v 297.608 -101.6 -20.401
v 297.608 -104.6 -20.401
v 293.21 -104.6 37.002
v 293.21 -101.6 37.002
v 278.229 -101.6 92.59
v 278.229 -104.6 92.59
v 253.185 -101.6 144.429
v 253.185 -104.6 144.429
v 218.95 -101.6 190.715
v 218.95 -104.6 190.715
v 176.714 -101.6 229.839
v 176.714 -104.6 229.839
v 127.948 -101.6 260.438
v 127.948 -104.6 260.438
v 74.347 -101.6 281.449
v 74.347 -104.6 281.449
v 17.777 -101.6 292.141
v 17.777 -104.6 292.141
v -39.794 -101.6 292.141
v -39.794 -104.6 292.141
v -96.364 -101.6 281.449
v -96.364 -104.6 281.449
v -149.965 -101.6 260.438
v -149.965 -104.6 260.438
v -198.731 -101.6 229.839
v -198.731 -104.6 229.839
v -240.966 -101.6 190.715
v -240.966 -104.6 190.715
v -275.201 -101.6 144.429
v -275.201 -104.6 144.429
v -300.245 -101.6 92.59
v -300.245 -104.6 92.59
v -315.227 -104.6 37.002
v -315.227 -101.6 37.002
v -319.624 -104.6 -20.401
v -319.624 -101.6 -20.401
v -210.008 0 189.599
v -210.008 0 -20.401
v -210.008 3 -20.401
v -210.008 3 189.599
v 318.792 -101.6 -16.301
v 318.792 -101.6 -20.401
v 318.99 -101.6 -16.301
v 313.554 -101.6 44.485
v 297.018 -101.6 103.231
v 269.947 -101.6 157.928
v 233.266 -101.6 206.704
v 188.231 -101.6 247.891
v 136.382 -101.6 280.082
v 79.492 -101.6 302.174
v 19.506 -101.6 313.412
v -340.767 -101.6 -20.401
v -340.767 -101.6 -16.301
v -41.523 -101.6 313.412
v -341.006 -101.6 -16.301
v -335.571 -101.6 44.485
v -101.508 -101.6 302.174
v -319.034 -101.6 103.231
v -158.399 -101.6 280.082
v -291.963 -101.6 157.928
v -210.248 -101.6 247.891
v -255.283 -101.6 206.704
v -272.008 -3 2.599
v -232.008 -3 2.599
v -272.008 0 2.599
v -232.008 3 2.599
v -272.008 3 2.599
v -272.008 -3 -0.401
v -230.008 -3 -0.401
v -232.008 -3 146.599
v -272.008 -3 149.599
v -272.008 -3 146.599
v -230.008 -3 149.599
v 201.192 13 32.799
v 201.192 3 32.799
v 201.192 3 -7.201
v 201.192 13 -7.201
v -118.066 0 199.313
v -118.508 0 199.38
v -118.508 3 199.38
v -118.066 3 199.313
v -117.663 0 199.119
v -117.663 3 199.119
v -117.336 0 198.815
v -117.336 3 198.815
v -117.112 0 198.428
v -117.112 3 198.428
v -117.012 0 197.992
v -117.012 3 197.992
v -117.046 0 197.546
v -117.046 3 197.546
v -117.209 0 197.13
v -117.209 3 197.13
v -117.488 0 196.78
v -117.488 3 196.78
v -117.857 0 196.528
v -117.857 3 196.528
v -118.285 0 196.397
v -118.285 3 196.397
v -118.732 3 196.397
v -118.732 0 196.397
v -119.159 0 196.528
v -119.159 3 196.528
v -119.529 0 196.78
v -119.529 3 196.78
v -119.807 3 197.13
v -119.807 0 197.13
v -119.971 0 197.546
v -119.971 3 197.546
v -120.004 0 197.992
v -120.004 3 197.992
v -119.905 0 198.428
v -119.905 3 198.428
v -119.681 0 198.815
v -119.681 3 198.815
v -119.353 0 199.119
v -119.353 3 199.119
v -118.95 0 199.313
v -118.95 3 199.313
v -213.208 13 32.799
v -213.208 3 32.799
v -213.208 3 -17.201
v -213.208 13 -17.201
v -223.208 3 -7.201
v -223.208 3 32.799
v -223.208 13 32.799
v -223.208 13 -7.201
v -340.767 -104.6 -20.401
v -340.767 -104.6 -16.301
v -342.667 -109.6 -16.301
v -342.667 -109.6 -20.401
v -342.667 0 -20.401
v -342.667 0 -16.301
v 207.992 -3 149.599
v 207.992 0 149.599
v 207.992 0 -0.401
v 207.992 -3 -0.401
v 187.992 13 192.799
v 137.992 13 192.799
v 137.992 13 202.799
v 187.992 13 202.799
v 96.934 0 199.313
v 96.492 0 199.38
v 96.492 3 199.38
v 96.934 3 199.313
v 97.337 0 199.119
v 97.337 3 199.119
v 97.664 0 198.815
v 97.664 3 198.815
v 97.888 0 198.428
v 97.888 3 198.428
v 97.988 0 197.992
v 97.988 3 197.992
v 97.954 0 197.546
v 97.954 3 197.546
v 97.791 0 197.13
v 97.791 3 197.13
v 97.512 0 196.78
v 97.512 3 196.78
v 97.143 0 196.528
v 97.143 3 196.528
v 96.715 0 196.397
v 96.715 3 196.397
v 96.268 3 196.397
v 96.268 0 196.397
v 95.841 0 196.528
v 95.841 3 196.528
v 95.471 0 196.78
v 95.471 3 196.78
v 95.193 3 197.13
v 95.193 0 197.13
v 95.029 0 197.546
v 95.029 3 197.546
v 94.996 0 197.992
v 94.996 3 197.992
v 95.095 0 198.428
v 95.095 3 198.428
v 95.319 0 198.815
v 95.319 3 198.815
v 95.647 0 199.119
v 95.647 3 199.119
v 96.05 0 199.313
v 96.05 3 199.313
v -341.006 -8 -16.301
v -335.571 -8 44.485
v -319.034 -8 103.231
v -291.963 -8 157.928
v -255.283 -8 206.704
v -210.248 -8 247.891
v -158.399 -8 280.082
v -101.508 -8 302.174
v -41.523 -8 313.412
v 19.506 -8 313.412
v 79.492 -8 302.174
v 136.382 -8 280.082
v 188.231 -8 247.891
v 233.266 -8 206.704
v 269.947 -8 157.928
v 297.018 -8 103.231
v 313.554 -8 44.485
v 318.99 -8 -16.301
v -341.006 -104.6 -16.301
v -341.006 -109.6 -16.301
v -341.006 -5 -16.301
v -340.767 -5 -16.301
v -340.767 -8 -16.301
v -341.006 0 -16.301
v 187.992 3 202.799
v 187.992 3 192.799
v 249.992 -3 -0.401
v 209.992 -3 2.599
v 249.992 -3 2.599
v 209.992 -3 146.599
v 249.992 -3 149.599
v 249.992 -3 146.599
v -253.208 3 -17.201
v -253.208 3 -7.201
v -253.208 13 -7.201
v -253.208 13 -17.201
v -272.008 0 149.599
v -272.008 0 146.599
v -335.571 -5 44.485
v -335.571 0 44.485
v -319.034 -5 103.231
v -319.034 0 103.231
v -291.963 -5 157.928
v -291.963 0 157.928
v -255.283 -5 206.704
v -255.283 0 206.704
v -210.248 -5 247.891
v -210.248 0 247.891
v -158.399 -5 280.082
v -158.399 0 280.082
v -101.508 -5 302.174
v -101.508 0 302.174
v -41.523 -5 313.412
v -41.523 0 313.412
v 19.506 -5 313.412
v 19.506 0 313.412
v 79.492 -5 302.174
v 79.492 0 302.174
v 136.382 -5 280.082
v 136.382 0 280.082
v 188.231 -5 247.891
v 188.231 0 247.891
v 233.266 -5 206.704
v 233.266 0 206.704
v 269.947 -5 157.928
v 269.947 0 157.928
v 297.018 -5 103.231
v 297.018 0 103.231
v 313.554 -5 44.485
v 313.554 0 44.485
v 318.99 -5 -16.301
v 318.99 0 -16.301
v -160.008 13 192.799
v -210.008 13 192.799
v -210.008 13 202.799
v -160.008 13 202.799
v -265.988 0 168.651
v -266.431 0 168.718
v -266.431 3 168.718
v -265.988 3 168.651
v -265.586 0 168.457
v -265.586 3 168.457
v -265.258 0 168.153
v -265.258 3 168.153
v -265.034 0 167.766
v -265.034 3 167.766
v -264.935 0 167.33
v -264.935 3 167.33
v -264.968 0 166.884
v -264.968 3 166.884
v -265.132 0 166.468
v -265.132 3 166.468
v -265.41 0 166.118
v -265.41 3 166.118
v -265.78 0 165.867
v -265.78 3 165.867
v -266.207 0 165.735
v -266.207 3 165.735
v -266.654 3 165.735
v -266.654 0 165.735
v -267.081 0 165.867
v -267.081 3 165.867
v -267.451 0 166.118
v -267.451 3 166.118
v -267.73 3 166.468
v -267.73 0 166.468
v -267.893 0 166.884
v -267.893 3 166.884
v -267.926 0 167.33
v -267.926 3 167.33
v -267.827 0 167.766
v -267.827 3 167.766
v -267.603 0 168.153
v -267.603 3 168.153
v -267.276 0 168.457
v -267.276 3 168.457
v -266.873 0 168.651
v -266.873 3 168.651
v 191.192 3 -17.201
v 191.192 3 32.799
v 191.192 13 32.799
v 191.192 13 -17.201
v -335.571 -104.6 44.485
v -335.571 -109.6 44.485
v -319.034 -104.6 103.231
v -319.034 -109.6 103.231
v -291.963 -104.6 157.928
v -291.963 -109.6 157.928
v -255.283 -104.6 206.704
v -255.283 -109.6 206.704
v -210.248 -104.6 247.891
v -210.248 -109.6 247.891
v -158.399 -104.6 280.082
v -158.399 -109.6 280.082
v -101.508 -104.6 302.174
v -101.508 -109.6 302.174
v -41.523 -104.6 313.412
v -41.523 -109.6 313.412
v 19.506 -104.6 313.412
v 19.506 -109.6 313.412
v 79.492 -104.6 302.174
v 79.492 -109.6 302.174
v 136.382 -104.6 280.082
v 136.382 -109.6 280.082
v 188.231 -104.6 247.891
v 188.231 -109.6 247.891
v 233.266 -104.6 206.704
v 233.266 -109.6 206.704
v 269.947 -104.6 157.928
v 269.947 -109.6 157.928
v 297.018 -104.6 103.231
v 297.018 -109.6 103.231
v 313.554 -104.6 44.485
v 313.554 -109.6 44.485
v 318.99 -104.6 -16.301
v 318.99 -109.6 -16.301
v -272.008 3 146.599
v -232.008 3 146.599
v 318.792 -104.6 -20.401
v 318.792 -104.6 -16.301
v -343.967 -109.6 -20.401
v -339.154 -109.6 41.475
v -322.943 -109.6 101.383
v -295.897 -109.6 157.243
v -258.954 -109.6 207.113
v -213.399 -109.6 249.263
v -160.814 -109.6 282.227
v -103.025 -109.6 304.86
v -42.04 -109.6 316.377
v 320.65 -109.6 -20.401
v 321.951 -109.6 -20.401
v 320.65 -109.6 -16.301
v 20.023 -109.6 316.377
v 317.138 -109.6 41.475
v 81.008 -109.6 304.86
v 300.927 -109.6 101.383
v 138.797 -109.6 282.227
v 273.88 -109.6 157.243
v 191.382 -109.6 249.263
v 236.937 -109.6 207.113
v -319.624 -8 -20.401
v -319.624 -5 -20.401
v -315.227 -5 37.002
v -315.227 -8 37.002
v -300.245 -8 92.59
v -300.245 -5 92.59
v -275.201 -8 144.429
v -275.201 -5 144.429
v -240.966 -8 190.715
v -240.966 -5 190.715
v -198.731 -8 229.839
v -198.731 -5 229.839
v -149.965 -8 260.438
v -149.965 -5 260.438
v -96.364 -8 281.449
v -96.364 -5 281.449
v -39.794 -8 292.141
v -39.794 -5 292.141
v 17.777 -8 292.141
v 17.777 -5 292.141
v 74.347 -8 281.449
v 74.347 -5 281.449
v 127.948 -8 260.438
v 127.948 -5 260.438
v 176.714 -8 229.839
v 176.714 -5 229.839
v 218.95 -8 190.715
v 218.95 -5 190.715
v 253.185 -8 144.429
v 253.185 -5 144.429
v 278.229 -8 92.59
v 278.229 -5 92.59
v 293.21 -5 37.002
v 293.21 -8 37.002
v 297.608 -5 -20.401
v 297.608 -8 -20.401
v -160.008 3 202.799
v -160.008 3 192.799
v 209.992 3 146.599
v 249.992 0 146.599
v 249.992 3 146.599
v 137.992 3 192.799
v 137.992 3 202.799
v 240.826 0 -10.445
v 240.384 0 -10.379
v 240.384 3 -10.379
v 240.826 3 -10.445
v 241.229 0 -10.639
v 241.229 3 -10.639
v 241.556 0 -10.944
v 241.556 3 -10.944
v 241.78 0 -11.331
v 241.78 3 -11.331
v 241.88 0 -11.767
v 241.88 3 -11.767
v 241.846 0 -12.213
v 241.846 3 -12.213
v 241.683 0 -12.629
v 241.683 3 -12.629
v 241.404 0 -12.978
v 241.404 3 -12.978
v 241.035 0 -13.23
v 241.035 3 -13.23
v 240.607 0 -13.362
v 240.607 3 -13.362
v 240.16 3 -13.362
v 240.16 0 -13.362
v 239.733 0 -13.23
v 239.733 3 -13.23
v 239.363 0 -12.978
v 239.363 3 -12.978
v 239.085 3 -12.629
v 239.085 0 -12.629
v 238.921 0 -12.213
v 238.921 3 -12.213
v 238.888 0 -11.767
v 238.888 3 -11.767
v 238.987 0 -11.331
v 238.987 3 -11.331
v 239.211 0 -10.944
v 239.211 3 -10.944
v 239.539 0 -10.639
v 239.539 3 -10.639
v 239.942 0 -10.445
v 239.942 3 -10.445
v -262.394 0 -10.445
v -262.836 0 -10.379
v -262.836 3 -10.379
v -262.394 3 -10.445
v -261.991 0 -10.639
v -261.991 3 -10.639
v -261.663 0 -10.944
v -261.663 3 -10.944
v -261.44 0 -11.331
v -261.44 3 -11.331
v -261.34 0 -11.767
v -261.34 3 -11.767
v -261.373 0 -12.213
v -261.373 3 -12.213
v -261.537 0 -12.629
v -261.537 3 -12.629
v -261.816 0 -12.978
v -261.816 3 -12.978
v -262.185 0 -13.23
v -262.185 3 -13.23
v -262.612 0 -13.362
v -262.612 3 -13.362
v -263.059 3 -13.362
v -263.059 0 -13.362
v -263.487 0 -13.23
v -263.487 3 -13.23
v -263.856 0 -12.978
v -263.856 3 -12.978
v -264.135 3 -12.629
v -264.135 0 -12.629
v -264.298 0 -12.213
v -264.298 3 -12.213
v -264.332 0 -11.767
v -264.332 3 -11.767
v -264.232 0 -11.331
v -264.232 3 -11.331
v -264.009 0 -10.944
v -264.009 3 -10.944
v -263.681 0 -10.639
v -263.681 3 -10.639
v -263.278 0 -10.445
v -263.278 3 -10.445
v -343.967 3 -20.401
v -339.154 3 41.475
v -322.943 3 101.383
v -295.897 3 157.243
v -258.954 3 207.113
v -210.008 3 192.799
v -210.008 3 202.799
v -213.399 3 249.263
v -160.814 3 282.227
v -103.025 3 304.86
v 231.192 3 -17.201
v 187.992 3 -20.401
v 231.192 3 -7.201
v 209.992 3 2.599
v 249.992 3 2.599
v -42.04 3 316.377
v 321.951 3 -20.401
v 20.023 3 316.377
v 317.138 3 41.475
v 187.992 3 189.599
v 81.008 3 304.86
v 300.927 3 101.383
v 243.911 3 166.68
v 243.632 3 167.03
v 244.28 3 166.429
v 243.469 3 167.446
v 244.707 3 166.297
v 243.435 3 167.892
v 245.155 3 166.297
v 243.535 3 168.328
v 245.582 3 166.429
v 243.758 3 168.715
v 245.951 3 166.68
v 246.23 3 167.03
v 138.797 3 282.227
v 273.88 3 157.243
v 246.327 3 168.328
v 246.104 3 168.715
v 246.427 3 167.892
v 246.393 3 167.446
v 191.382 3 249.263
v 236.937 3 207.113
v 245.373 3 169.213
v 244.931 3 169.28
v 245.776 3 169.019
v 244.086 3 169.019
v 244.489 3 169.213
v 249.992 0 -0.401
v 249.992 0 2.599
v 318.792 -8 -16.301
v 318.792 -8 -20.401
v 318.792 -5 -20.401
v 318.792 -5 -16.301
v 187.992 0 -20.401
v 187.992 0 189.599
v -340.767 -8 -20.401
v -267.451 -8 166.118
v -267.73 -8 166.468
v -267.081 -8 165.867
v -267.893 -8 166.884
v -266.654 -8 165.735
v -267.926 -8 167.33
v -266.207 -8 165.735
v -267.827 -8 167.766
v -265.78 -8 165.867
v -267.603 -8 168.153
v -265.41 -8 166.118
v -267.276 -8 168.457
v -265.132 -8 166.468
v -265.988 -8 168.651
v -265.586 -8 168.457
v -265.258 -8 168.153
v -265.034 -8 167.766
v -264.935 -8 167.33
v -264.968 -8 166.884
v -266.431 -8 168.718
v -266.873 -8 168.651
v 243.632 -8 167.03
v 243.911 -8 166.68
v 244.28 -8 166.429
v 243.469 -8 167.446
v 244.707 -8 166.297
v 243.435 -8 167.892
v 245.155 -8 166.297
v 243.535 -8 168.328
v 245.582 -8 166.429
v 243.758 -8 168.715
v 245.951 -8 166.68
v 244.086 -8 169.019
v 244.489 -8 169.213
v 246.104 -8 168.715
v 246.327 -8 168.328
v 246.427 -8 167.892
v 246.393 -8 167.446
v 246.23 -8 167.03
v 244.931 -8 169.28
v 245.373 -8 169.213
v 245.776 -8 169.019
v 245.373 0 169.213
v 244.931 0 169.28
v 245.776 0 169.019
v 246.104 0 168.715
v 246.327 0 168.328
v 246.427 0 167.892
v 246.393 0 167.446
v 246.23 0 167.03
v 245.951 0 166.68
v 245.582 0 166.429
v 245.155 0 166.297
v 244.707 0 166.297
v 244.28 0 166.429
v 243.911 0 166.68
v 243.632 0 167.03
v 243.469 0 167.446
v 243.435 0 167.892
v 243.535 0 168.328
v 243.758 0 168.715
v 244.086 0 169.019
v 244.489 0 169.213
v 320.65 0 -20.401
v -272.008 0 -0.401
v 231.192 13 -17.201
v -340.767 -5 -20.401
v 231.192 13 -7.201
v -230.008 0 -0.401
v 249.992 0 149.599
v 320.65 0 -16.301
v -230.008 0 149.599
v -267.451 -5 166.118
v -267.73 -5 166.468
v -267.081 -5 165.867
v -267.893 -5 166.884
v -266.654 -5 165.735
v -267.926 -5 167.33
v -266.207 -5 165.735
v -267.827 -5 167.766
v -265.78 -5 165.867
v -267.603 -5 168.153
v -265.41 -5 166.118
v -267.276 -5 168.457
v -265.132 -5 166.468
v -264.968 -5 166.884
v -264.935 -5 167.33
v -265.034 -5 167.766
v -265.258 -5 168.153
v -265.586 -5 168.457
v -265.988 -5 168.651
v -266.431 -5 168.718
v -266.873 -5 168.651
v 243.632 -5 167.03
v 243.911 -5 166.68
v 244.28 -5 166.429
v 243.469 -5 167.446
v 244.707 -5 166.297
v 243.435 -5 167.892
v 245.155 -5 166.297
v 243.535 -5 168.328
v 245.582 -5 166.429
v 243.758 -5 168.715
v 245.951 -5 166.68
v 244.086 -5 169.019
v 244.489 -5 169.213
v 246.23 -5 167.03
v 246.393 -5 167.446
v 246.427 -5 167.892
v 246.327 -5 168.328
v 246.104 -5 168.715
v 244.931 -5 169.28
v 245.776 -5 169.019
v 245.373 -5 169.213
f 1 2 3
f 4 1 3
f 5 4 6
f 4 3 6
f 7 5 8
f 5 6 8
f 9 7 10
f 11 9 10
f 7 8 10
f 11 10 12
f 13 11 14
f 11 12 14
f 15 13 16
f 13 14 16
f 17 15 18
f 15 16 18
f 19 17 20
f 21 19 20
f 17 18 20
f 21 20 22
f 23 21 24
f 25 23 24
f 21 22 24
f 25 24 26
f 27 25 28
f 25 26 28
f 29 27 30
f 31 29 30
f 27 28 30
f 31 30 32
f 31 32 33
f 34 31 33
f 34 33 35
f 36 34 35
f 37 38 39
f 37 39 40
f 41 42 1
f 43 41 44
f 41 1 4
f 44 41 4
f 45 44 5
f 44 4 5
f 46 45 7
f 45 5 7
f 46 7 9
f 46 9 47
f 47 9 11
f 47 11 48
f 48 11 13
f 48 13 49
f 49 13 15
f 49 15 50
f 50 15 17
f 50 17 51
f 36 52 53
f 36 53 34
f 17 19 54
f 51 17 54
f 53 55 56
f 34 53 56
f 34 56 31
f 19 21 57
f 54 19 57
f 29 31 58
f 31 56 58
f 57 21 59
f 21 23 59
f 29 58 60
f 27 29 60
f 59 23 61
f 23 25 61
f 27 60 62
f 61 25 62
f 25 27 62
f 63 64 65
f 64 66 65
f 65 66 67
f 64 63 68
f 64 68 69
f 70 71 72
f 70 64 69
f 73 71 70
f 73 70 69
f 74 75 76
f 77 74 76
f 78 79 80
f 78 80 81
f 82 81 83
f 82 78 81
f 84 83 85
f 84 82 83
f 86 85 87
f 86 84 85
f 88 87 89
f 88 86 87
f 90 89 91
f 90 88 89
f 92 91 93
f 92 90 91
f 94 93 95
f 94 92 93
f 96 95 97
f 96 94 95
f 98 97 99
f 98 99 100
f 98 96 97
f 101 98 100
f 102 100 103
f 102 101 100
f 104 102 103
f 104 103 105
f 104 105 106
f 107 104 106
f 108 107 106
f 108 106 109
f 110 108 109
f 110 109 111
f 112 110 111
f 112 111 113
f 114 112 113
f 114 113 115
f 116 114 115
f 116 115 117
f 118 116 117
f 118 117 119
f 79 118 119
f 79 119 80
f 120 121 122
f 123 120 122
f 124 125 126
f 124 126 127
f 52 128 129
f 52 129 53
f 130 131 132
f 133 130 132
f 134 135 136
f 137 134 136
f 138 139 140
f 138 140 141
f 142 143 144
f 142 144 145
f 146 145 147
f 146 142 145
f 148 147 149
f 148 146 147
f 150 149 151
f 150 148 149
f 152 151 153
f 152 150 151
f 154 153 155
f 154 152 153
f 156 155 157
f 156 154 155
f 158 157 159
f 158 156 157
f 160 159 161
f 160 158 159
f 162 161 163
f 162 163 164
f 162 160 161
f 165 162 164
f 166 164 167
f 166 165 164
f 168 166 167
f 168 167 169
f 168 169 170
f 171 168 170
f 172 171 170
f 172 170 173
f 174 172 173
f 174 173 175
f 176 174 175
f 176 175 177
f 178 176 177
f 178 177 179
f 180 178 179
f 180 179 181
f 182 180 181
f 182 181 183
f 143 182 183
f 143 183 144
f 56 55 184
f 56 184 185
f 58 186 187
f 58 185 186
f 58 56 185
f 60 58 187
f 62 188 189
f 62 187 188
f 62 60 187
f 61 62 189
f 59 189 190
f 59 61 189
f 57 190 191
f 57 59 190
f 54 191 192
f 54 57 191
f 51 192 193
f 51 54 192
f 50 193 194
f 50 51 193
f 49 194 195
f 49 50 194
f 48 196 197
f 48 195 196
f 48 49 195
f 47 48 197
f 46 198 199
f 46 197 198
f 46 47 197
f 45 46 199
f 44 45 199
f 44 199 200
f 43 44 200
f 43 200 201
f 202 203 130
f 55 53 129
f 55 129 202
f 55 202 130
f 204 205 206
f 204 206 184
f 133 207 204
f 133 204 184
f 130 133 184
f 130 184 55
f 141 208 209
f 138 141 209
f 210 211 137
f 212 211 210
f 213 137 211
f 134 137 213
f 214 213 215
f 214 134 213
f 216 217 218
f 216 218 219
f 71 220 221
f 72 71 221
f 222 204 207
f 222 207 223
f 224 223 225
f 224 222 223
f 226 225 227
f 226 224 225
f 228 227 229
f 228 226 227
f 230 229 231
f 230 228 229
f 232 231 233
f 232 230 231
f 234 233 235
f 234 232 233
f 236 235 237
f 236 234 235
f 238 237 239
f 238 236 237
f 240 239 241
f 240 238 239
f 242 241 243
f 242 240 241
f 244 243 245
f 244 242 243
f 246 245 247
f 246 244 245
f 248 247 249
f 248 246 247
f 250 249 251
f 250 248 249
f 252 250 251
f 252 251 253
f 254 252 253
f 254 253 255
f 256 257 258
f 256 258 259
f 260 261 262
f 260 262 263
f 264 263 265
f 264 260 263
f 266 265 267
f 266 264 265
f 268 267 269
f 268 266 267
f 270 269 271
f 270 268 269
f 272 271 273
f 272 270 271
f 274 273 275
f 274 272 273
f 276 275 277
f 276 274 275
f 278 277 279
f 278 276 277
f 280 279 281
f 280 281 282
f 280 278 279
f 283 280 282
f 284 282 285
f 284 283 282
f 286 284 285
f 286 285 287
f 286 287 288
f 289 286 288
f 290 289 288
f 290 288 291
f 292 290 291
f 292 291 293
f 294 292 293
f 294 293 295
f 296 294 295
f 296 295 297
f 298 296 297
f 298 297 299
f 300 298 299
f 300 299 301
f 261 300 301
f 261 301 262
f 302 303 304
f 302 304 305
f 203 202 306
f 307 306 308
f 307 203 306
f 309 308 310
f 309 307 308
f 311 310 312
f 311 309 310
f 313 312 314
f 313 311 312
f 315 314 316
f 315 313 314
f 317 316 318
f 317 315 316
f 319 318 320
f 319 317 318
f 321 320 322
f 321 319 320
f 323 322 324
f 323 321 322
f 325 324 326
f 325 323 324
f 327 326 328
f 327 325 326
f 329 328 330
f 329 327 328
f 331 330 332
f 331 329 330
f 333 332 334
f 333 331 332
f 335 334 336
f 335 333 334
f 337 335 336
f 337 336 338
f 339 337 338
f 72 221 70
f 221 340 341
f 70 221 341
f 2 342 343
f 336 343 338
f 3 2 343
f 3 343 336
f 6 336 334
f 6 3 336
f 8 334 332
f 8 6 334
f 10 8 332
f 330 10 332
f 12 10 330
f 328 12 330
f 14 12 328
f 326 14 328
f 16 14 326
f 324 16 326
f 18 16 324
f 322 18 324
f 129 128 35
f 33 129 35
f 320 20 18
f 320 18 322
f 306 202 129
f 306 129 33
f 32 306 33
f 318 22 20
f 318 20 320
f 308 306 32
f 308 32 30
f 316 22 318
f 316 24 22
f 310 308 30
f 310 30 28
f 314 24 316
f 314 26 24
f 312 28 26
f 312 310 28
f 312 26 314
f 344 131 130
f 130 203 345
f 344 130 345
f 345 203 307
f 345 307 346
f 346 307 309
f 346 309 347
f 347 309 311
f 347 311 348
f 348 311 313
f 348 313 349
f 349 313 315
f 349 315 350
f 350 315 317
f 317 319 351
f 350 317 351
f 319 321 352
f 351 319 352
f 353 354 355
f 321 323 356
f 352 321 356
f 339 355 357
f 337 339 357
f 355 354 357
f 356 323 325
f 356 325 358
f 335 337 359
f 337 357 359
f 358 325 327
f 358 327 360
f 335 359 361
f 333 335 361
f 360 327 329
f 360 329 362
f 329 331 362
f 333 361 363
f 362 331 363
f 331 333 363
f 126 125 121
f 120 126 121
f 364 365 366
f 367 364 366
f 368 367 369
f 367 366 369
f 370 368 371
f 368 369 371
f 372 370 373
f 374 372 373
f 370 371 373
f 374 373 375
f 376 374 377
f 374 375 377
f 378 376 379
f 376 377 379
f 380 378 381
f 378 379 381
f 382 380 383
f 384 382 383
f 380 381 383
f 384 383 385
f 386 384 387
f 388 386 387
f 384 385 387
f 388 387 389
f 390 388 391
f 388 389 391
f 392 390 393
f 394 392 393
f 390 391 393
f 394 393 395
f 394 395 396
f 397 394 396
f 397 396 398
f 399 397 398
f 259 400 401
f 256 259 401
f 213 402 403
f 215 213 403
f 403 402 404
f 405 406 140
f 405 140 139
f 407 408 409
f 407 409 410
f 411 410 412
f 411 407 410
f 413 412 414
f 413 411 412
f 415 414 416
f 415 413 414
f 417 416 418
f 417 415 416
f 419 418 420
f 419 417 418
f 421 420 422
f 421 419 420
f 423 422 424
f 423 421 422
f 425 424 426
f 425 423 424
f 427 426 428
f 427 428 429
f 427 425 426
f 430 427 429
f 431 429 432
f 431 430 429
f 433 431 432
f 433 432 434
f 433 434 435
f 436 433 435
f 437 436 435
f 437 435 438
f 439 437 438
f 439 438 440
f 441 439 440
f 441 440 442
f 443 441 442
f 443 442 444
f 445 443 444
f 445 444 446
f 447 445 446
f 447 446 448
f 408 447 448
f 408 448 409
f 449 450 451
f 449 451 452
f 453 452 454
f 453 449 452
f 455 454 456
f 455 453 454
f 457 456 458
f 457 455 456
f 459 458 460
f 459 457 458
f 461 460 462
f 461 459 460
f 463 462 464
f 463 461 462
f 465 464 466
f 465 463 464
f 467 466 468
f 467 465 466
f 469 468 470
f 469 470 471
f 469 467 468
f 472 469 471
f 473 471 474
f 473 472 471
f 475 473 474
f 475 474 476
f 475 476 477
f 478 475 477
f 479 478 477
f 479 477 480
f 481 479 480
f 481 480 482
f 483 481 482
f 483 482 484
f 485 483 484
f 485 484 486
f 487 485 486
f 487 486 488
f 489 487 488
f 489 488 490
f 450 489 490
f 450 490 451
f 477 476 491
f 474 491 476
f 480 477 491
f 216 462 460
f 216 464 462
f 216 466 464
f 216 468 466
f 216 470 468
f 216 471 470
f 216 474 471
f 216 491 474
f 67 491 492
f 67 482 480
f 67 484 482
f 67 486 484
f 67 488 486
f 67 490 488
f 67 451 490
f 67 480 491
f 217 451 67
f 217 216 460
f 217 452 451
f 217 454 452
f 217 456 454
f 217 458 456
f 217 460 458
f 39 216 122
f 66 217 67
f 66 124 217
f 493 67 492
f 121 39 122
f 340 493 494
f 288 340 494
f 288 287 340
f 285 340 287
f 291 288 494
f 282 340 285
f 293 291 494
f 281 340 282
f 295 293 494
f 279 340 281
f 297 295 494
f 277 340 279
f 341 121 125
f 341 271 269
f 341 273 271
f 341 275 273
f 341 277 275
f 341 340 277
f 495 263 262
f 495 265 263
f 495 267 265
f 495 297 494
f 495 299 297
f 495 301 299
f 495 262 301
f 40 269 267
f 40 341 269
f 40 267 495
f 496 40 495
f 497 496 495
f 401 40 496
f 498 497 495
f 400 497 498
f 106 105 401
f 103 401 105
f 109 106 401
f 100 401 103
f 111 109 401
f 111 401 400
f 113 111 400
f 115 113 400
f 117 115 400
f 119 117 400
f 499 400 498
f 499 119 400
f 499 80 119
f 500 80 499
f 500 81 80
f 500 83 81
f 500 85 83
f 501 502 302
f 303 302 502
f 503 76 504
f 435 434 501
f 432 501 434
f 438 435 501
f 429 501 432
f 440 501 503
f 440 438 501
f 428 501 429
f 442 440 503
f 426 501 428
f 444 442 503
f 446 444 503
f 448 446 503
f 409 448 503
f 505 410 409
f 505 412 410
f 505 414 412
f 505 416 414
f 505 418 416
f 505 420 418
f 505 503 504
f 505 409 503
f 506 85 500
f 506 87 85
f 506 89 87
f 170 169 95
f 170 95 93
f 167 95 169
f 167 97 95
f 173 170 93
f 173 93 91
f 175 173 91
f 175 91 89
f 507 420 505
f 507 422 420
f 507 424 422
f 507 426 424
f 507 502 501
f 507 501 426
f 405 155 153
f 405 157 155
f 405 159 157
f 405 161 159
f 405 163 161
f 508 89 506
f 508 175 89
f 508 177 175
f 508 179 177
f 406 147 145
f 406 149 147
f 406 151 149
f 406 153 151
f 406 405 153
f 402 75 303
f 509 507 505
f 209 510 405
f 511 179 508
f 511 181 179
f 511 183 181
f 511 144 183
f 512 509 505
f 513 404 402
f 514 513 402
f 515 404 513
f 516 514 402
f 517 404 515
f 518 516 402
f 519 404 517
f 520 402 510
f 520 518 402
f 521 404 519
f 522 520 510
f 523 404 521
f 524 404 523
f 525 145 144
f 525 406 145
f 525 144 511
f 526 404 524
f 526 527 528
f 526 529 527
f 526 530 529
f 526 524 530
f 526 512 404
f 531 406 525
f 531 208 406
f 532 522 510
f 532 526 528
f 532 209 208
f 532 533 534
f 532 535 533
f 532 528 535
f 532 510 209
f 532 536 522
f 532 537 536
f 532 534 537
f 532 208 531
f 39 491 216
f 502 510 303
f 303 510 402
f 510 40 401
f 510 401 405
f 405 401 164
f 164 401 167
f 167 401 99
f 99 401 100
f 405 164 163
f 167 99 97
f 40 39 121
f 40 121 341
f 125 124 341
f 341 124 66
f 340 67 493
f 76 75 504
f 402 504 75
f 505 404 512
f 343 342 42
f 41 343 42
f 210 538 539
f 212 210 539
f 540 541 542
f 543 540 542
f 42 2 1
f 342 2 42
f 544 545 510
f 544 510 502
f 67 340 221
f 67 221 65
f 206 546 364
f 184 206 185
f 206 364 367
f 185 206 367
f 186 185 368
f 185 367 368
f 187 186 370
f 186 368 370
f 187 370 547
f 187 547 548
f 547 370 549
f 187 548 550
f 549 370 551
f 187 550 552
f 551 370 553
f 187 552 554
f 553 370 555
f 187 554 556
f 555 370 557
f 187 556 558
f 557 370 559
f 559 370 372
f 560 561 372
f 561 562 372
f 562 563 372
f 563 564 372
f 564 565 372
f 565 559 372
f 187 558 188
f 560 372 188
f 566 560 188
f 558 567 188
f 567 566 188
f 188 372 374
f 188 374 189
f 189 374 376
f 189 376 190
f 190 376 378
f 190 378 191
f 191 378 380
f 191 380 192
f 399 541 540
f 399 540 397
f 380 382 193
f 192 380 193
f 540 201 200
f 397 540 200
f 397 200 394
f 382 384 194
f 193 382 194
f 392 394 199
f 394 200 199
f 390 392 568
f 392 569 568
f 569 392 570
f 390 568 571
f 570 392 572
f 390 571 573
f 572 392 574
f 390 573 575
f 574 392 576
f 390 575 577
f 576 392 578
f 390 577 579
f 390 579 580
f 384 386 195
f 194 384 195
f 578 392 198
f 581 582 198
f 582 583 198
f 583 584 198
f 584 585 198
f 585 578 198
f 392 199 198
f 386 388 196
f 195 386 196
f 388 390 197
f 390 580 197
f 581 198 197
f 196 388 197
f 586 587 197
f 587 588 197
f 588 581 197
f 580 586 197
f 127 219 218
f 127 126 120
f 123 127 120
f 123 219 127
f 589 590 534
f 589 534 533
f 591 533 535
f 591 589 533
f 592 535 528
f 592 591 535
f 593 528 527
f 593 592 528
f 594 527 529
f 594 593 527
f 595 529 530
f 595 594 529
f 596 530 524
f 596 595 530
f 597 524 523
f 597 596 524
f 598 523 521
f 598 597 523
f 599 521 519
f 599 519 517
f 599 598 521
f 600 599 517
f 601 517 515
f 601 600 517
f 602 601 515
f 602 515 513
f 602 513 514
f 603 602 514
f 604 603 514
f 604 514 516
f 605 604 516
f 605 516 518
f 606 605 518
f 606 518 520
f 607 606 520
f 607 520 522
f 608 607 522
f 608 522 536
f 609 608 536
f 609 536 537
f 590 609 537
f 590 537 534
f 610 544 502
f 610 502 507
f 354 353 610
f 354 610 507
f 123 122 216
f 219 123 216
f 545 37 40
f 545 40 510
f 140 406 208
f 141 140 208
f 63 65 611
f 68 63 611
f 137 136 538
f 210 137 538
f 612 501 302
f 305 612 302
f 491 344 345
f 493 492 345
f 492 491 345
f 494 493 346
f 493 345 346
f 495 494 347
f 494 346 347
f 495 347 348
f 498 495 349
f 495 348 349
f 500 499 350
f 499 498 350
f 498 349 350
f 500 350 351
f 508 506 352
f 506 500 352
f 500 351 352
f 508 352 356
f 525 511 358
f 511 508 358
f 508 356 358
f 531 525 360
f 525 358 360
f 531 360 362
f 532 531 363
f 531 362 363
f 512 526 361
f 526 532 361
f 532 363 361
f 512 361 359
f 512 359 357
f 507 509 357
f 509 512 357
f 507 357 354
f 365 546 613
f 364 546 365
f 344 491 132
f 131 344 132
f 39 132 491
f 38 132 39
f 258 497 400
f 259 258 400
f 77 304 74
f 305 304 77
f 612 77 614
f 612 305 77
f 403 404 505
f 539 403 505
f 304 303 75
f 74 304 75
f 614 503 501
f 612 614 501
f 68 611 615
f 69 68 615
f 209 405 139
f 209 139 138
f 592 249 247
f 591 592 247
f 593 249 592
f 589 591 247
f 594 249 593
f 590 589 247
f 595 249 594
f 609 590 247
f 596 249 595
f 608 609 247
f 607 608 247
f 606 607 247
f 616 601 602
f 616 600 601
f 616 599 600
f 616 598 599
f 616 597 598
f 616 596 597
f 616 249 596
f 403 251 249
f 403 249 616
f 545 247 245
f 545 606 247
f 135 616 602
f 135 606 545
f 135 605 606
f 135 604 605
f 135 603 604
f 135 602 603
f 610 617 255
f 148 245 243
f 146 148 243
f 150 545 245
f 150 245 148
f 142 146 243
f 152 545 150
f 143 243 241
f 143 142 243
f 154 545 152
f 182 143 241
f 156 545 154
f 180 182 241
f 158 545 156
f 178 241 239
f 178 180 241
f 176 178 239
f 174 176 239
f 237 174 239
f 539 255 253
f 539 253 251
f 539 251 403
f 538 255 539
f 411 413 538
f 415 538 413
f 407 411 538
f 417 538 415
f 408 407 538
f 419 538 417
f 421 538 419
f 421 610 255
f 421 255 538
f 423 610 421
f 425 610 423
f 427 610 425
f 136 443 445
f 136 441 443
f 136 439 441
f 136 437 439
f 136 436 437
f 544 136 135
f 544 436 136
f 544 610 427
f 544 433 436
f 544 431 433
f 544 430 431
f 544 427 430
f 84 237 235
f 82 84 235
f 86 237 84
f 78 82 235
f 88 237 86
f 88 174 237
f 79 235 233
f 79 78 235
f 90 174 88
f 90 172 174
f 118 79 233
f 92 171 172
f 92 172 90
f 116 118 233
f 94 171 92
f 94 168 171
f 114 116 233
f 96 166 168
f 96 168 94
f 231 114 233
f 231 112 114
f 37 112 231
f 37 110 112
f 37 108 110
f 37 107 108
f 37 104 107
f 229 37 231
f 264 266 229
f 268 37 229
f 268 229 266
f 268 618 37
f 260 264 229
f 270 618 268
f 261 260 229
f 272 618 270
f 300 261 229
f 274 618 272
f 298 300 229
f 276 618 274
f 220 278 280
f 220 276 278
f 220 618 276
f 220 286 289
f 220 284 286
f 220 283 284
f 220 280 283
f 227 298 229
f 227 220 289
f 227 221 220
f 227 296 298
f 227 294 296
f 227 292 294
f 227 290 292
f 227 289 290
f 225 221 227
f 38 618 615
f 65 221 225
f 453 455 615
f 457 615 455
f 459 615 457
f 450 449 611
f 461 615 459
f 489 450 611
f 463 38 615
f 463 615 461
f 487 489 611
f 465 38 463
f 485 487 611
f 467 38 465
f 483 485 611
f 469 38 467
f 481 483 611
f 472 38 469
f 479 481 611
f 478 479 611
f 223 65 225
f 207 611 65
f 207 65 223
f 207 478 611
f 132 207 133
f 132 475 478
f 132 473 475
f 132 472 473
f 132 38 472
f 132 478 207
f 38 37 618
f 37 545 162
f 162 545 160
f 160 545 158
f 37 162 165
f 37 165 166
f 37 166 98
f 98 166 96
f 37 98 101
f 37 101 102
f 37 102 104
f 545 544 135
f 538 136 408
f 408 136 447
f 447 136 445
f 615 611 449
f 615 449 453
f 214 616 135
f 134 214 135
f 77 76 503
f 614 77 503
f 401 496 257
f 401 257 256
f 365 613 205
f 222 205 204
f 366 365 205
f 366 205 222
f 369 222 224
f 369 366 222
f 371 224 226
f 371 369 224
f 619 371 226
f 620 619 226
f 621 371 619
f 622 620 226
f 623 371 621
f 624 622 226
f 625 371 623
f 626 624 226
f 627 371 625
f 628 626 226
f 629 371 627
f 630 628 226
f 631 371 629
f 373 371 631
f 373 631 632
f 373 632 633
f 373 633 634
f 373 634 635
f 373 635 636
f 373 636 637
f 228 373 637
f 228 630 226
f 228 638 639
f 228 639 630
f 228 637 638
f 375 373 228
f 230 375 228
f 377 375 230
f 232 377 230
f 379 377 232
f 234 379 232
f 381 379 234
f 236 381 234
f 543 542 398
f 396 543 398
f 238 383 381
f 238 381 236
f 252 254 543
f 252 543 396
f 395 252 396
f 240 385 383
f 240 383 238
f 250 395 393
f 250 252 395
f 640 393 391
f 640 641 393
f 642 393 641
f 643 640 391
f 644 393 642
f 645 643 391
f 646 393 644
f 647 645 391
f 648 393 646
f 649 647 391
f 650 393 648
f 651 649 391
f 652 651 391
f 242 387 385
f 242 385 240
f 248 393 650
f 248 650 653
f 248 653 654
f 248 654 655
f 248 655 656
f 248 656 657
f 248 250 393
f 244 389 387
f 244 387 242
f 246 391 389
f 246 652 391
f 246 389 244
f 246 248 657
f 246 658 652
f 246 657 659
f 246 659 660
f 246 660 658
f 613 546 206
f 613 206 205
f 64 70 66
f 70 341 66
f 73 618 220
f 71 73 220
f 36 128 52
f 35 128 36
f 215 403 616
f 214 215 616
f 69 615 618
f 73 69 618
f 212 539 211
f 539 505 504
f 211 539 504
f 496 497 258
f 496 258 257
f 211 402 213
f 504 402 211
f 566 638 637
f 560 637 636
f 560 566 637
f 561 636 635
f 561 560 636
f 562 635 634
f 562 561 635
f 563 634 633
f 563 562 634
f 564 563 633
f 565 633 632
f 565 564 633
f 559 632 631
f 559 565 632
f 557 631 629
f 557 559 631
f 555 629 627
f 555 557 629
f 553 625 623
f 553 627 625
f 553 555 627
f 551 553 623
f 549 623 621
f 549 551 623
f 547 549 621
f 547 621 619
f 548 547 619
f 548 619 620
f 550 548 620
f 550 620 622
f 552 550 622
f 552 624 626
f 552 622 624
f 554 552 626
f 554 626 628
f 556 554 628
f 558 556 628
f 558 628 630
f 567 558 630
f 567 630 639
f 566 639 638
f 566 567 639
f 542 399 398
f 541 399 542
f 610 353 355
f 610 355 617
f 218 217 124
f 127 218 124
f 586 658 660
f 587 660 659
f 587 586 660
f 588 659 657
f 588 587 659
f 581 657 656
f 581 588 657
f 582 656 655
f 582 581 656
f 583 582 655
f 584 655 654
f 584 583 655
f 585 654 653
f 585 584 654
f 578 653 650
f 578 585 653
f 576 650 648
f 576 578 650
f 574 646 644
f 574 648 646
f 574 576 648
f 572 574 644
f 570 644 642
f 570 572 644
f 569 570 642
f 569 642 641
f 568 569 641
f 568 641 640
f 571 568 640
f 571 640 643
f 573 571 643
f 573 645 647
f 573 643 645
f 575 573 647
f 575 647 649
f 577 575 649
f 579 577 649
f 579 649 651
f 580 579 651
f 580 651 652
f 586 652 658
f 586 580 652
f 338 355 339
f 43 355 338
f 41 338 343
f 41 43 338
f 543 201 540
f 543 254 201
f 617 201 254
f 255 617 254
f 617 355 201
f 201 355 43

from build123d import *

# Parameters (mm, degrees)
BOSS_EXTRUDE2_DEPTH      = 3
BOSS_EXTRUDE2_DEPTH_BACK = 109.6
SKETCH3_R                = 333
SKETCH3_R_2              = 330
SKETCH5_R                = 330
BOSS_EXTRUDE4_DEPTH      = 3
SKETCH6_R                = 333
BOSS_EXTRUDE6_DEPTH      = 3
SKETCH17_R               = 330
BOSS_EXTRUDE9_DEPTH      = 3
CUT_EXTRUDE1_DEPTH       = 501.508020593
CUT_EXTRUDE1_DEPTH_BACK  = 501.508020593
SKETCH18_W               = 712.715925151
SKETCH18_H               = 346.222463294
SKETCH19_W               = 50
SKETCH19_H               = 10
SKETCH19_W_2             = 10
SKETCH19_H_2             = 50
SKETCH19_W_3             = 30
BOSS_EXTRUDE10_DEPTH     = 10
SKETCH20_W               = 1.85878785
SKETCH20_H               = 109.6
SKETCH20_W_2             = 1.900186503
CUT_EXTRUDE2_DEPTH       = 4.1
CUT_EXTRUDE3_START       = -11
SKETCH23_R               = 1.5
CUT_EXTRUDE3_DEPTH       = 11
SKETCH24_W               = 40
SKETCH24_H               = 144
CUT_EXTRUDE4_DEPTH       = 3
BOSS_EXTRUDE11_DEPTH     = 3


with BuildPart() as part:
    # Sketch3 → Boss-Extrude2 (new, two sides: drawn at the far end of the back side and taken through both)
    with BuildSketch(Plane(origin=(0, 0, 0), x_dir=(1, 0, 0), z_dir=(0, 1, 0)).offset(-BOSS_EXTRUDE2_DEPTH_BACK)):
        with Locations(Location((-11.008302555, 15.174390861, 0), (0, 0, 270))):
            Circle(SKETCH3_R)
        with Locations(Location((-11.008302555, 15.174390861, 0), (0, 0, 270))):
            Circle(SKETCH3_R_2, mode=Mode.SUBTRACT)
    extrude(amount=BOSS_EXTRUDE2_DEPTH + BOSS_EXTRUDE2_DEPTH_BACK)

    # Sketch5 → Boss-Extrude4 (add)
    with BuildSketch(Plane.XZ.offset(104.6)):
        with Locations(Location((-11.008302555, -15.174390861, 0), (0, 0, 90))):
            Circle(SKETCH5_R)
        with BuildLine():
            Line((-164.332788108, -283.060090014), (142.316182998, -283.060090014))
            ThreePointArc((142.316182998, -283.060090014), (-11.008302555, 293.485852256), (-164.332788108, -283.060090014))
        make_face(mode=Mode.SUBTRACT)
    extrude(amount=-BOSS_EXTRUDE4_DEPTH)

    # Sketch6 → Boss-Extrude6 (add)
    with BuildSketch(Plane(origin=(0, 0, 0), x_dir=(1, 0, 0), z_dir=(0, 1, 0))):
        with Locations(Location((-11.008302555, 15.174390861, 0), (0, 0, 270))):
            Circle(SKETCH6_R)
        Polygon((187.991697445, -189.598621739), (187.991697445, 20.401378261), (224.991697445, 20.401378261), (224.991697445, 100.970480915), (60.317326344, 288.174390861), (-82.333931455, 288.174390861), (-247.008302555, 100.970480915), (-247.008302555, 20.401378261), (-210.008302555, 20.401378261), (-210.008302555, -189.598621739), align=None, mode=Mode.SUBTRACT)
    extrude(amount=BOSS_EXTRUDE6_DEPTH)

    # Sketch17 → Boss-Extrude9 (add)
    with BuildSketch(Plane(origin=(0, -5, 0), x_dir=(1, 0, 0), z_dir=(0, 1, 0))):
        with Locations(Location((-11.008302555, 15.174390861, 0), (0, 0, 270))):
            Circle(SKETCH17_R)
        with BuildLine():
            Line((142.316182998, 283.060090014), (-164.332788108, 283.060090014))
            ThreePointArc((-164.332788108, 283.060090014), (-11.008302555, -293.485852256), (142.316182998, 283.060090014))
        make_face(mode=Mode.SUBTRACT)
    extrude(amount=-BOSS_EXTRUDE9_DEPTH)

    # Sketch18 → Cut-Extrude1 (cut, two sides: drawn at the far end of the back side and taken through both)
    with BuildSketch(Plane(origin=(0, -5, 0), x_dir=(1, 0, 0), z_dir=(0, 1, 0)).offset(-CUT_EXTRUDE1_DEPTH_BACK)):
        with Locations((-7.081493051, 193.512609908)):
            Rectangle(SKETCH18_W, SKETCH18_H)
    extrude(amount=CUT_EXTRUDE1_DEPTH + CUT_EXTRUDE1_DEPTH_BACK, mode=Mode.SUBTRACT)

    # Sketch19 → Boss-Extrude10 (add)
    with BuildSketch(Plane(origin=(0, 3, 0), x_dir=(1, 0, 0), z_dir=(0, 1, 0))):
        with Locations((-185.008302555, -197.798621739)):
            Rectangle(SKETCH19_W, SKETCH19_H)
        with Locations((162.991697445, -197.798621739)):
            Rectangle(SKETCH19_W, SKETCH19_H)
        with Locations((196.191697445, -7.798621739)):
            Rectangle(SKETCH19_W_2, SKETCH19_H_2)
        with Locations((216.191697445, 12.201378261)):
            Rectangle(SKETCH19_W_3, SKETCH19_H)
        with Locations((-238.208302555, 12.201378261)):
            Rectangle(SKETCH19_W_3, SKETCH19_H)
        with Locations((-218.208302555, -7.798621739)):
            Rectangle(SKETCH19_W_2, SKETCH19_H_2)
    extrude(amount=BOSS_EXTRUDE10_DEPTH)

    # Sketch20 → Cut-Extrude2 (cut)
    with BuildSketch(Plane(origin=(0, 0, -20.401378261), x_dir=(-1, 0, 0), z_dir=(0, 0, -1))):
        with Locations((-319.72109137, -54.8)):
            Rectangle(SKETCH20_W, SKETCH20_H)
        with Locations((341.716997154, -54.8)):
            Rectangle(SKETCH20_W_2, SKETCH20_H)
    extrude(amount=-CUT_EXTRUDE2_DEPTH, mode=Mode.SUBTRACT)

    # Sketch23 → Cut-Extrude3 (cut)
    with BuildSketch(Plane(origin=(0, 3, 0), x_dir=(1, 0, 0), z_dir=(0, 1, 0)).offset(CUT_EXTRUDE3_START)):
        with Locations(Location((-266.430595358, -167.218017294, 0), (0, 0, 270))):
            Circle(SKETCH23_R)
        with Locations(Location((-262.835878396, 11.878802847, 0), (0, 0, 270))):
            Circle(SKETCH23_R)
        with Locations(Location((240.383738856, 11.878802847, 0), (0, 0, 270))):
            Circle(SKETCH23_R)
        with Locations(Location((244.931055017, -167.7800562, 0), (0, 0, 270))):
            Circle(SKETCH23_R)
        with Locations(Location((-118.508302555, -197.879856977, 0), (0, 0, 270))):
            Circle(SKETCH23_R)
        with Locations(Location((96.491697445, -197.879856977, 0), (0, 0, 270))):
            Circle(SKETCH23_R)
    extrude(amount=CUT_EXTRUDE3_DEPTH, mode=Mode.SUBTRACT)

    # Sketch24 → Cut-Extrude4 (cut)
    with BuildSketch(Plane(origin=(0, 3, 0), x_dir=(1, 0, 0), z_dir=(0, 1, 0))):
        with Locations((-252.008302555, -74.598621739)):
            Rectangle(SKETCH24_W, SKETCH24_H)
        with Locations((229.991697445, -74.598621739)):
            Rectangle(SKETCH24_W, SKETCH24_H)
    extrude(amount=-CUT_EXTRUDE4_DEPTH, mode=Mode.SUBTRACT)

    # Sketch25 → Boss-Extrude11 (add)
    with BuildSketch(Plane.XZ):
        Polygon((-272.008302555, 149.598621739), (-272.008302555, 146.598621739), (-232.008302555, 146.598621739), (-232.008302555, 2.598621739), (-272.008302555, 2.598621739), (-272.008302555, -0.401378261), (-230.008302555, -0.401378261), (-230.008302555, 149.598621739), align=None)
        Polygon((249.991697445, 149.598621739), (207.991697445, 149.598621739), (207.991697445, -0.401378261), (249.991697445, -0.401378261), (249.991697445, 2.598621739), (209.991697445, 2.598621739), (209.991697445, 146.598621739), (249.991697445, 146.598621739), align=None)
    extrude(amount=BOSS_EXTRUDE11_DEPTH)


solid = part.part
